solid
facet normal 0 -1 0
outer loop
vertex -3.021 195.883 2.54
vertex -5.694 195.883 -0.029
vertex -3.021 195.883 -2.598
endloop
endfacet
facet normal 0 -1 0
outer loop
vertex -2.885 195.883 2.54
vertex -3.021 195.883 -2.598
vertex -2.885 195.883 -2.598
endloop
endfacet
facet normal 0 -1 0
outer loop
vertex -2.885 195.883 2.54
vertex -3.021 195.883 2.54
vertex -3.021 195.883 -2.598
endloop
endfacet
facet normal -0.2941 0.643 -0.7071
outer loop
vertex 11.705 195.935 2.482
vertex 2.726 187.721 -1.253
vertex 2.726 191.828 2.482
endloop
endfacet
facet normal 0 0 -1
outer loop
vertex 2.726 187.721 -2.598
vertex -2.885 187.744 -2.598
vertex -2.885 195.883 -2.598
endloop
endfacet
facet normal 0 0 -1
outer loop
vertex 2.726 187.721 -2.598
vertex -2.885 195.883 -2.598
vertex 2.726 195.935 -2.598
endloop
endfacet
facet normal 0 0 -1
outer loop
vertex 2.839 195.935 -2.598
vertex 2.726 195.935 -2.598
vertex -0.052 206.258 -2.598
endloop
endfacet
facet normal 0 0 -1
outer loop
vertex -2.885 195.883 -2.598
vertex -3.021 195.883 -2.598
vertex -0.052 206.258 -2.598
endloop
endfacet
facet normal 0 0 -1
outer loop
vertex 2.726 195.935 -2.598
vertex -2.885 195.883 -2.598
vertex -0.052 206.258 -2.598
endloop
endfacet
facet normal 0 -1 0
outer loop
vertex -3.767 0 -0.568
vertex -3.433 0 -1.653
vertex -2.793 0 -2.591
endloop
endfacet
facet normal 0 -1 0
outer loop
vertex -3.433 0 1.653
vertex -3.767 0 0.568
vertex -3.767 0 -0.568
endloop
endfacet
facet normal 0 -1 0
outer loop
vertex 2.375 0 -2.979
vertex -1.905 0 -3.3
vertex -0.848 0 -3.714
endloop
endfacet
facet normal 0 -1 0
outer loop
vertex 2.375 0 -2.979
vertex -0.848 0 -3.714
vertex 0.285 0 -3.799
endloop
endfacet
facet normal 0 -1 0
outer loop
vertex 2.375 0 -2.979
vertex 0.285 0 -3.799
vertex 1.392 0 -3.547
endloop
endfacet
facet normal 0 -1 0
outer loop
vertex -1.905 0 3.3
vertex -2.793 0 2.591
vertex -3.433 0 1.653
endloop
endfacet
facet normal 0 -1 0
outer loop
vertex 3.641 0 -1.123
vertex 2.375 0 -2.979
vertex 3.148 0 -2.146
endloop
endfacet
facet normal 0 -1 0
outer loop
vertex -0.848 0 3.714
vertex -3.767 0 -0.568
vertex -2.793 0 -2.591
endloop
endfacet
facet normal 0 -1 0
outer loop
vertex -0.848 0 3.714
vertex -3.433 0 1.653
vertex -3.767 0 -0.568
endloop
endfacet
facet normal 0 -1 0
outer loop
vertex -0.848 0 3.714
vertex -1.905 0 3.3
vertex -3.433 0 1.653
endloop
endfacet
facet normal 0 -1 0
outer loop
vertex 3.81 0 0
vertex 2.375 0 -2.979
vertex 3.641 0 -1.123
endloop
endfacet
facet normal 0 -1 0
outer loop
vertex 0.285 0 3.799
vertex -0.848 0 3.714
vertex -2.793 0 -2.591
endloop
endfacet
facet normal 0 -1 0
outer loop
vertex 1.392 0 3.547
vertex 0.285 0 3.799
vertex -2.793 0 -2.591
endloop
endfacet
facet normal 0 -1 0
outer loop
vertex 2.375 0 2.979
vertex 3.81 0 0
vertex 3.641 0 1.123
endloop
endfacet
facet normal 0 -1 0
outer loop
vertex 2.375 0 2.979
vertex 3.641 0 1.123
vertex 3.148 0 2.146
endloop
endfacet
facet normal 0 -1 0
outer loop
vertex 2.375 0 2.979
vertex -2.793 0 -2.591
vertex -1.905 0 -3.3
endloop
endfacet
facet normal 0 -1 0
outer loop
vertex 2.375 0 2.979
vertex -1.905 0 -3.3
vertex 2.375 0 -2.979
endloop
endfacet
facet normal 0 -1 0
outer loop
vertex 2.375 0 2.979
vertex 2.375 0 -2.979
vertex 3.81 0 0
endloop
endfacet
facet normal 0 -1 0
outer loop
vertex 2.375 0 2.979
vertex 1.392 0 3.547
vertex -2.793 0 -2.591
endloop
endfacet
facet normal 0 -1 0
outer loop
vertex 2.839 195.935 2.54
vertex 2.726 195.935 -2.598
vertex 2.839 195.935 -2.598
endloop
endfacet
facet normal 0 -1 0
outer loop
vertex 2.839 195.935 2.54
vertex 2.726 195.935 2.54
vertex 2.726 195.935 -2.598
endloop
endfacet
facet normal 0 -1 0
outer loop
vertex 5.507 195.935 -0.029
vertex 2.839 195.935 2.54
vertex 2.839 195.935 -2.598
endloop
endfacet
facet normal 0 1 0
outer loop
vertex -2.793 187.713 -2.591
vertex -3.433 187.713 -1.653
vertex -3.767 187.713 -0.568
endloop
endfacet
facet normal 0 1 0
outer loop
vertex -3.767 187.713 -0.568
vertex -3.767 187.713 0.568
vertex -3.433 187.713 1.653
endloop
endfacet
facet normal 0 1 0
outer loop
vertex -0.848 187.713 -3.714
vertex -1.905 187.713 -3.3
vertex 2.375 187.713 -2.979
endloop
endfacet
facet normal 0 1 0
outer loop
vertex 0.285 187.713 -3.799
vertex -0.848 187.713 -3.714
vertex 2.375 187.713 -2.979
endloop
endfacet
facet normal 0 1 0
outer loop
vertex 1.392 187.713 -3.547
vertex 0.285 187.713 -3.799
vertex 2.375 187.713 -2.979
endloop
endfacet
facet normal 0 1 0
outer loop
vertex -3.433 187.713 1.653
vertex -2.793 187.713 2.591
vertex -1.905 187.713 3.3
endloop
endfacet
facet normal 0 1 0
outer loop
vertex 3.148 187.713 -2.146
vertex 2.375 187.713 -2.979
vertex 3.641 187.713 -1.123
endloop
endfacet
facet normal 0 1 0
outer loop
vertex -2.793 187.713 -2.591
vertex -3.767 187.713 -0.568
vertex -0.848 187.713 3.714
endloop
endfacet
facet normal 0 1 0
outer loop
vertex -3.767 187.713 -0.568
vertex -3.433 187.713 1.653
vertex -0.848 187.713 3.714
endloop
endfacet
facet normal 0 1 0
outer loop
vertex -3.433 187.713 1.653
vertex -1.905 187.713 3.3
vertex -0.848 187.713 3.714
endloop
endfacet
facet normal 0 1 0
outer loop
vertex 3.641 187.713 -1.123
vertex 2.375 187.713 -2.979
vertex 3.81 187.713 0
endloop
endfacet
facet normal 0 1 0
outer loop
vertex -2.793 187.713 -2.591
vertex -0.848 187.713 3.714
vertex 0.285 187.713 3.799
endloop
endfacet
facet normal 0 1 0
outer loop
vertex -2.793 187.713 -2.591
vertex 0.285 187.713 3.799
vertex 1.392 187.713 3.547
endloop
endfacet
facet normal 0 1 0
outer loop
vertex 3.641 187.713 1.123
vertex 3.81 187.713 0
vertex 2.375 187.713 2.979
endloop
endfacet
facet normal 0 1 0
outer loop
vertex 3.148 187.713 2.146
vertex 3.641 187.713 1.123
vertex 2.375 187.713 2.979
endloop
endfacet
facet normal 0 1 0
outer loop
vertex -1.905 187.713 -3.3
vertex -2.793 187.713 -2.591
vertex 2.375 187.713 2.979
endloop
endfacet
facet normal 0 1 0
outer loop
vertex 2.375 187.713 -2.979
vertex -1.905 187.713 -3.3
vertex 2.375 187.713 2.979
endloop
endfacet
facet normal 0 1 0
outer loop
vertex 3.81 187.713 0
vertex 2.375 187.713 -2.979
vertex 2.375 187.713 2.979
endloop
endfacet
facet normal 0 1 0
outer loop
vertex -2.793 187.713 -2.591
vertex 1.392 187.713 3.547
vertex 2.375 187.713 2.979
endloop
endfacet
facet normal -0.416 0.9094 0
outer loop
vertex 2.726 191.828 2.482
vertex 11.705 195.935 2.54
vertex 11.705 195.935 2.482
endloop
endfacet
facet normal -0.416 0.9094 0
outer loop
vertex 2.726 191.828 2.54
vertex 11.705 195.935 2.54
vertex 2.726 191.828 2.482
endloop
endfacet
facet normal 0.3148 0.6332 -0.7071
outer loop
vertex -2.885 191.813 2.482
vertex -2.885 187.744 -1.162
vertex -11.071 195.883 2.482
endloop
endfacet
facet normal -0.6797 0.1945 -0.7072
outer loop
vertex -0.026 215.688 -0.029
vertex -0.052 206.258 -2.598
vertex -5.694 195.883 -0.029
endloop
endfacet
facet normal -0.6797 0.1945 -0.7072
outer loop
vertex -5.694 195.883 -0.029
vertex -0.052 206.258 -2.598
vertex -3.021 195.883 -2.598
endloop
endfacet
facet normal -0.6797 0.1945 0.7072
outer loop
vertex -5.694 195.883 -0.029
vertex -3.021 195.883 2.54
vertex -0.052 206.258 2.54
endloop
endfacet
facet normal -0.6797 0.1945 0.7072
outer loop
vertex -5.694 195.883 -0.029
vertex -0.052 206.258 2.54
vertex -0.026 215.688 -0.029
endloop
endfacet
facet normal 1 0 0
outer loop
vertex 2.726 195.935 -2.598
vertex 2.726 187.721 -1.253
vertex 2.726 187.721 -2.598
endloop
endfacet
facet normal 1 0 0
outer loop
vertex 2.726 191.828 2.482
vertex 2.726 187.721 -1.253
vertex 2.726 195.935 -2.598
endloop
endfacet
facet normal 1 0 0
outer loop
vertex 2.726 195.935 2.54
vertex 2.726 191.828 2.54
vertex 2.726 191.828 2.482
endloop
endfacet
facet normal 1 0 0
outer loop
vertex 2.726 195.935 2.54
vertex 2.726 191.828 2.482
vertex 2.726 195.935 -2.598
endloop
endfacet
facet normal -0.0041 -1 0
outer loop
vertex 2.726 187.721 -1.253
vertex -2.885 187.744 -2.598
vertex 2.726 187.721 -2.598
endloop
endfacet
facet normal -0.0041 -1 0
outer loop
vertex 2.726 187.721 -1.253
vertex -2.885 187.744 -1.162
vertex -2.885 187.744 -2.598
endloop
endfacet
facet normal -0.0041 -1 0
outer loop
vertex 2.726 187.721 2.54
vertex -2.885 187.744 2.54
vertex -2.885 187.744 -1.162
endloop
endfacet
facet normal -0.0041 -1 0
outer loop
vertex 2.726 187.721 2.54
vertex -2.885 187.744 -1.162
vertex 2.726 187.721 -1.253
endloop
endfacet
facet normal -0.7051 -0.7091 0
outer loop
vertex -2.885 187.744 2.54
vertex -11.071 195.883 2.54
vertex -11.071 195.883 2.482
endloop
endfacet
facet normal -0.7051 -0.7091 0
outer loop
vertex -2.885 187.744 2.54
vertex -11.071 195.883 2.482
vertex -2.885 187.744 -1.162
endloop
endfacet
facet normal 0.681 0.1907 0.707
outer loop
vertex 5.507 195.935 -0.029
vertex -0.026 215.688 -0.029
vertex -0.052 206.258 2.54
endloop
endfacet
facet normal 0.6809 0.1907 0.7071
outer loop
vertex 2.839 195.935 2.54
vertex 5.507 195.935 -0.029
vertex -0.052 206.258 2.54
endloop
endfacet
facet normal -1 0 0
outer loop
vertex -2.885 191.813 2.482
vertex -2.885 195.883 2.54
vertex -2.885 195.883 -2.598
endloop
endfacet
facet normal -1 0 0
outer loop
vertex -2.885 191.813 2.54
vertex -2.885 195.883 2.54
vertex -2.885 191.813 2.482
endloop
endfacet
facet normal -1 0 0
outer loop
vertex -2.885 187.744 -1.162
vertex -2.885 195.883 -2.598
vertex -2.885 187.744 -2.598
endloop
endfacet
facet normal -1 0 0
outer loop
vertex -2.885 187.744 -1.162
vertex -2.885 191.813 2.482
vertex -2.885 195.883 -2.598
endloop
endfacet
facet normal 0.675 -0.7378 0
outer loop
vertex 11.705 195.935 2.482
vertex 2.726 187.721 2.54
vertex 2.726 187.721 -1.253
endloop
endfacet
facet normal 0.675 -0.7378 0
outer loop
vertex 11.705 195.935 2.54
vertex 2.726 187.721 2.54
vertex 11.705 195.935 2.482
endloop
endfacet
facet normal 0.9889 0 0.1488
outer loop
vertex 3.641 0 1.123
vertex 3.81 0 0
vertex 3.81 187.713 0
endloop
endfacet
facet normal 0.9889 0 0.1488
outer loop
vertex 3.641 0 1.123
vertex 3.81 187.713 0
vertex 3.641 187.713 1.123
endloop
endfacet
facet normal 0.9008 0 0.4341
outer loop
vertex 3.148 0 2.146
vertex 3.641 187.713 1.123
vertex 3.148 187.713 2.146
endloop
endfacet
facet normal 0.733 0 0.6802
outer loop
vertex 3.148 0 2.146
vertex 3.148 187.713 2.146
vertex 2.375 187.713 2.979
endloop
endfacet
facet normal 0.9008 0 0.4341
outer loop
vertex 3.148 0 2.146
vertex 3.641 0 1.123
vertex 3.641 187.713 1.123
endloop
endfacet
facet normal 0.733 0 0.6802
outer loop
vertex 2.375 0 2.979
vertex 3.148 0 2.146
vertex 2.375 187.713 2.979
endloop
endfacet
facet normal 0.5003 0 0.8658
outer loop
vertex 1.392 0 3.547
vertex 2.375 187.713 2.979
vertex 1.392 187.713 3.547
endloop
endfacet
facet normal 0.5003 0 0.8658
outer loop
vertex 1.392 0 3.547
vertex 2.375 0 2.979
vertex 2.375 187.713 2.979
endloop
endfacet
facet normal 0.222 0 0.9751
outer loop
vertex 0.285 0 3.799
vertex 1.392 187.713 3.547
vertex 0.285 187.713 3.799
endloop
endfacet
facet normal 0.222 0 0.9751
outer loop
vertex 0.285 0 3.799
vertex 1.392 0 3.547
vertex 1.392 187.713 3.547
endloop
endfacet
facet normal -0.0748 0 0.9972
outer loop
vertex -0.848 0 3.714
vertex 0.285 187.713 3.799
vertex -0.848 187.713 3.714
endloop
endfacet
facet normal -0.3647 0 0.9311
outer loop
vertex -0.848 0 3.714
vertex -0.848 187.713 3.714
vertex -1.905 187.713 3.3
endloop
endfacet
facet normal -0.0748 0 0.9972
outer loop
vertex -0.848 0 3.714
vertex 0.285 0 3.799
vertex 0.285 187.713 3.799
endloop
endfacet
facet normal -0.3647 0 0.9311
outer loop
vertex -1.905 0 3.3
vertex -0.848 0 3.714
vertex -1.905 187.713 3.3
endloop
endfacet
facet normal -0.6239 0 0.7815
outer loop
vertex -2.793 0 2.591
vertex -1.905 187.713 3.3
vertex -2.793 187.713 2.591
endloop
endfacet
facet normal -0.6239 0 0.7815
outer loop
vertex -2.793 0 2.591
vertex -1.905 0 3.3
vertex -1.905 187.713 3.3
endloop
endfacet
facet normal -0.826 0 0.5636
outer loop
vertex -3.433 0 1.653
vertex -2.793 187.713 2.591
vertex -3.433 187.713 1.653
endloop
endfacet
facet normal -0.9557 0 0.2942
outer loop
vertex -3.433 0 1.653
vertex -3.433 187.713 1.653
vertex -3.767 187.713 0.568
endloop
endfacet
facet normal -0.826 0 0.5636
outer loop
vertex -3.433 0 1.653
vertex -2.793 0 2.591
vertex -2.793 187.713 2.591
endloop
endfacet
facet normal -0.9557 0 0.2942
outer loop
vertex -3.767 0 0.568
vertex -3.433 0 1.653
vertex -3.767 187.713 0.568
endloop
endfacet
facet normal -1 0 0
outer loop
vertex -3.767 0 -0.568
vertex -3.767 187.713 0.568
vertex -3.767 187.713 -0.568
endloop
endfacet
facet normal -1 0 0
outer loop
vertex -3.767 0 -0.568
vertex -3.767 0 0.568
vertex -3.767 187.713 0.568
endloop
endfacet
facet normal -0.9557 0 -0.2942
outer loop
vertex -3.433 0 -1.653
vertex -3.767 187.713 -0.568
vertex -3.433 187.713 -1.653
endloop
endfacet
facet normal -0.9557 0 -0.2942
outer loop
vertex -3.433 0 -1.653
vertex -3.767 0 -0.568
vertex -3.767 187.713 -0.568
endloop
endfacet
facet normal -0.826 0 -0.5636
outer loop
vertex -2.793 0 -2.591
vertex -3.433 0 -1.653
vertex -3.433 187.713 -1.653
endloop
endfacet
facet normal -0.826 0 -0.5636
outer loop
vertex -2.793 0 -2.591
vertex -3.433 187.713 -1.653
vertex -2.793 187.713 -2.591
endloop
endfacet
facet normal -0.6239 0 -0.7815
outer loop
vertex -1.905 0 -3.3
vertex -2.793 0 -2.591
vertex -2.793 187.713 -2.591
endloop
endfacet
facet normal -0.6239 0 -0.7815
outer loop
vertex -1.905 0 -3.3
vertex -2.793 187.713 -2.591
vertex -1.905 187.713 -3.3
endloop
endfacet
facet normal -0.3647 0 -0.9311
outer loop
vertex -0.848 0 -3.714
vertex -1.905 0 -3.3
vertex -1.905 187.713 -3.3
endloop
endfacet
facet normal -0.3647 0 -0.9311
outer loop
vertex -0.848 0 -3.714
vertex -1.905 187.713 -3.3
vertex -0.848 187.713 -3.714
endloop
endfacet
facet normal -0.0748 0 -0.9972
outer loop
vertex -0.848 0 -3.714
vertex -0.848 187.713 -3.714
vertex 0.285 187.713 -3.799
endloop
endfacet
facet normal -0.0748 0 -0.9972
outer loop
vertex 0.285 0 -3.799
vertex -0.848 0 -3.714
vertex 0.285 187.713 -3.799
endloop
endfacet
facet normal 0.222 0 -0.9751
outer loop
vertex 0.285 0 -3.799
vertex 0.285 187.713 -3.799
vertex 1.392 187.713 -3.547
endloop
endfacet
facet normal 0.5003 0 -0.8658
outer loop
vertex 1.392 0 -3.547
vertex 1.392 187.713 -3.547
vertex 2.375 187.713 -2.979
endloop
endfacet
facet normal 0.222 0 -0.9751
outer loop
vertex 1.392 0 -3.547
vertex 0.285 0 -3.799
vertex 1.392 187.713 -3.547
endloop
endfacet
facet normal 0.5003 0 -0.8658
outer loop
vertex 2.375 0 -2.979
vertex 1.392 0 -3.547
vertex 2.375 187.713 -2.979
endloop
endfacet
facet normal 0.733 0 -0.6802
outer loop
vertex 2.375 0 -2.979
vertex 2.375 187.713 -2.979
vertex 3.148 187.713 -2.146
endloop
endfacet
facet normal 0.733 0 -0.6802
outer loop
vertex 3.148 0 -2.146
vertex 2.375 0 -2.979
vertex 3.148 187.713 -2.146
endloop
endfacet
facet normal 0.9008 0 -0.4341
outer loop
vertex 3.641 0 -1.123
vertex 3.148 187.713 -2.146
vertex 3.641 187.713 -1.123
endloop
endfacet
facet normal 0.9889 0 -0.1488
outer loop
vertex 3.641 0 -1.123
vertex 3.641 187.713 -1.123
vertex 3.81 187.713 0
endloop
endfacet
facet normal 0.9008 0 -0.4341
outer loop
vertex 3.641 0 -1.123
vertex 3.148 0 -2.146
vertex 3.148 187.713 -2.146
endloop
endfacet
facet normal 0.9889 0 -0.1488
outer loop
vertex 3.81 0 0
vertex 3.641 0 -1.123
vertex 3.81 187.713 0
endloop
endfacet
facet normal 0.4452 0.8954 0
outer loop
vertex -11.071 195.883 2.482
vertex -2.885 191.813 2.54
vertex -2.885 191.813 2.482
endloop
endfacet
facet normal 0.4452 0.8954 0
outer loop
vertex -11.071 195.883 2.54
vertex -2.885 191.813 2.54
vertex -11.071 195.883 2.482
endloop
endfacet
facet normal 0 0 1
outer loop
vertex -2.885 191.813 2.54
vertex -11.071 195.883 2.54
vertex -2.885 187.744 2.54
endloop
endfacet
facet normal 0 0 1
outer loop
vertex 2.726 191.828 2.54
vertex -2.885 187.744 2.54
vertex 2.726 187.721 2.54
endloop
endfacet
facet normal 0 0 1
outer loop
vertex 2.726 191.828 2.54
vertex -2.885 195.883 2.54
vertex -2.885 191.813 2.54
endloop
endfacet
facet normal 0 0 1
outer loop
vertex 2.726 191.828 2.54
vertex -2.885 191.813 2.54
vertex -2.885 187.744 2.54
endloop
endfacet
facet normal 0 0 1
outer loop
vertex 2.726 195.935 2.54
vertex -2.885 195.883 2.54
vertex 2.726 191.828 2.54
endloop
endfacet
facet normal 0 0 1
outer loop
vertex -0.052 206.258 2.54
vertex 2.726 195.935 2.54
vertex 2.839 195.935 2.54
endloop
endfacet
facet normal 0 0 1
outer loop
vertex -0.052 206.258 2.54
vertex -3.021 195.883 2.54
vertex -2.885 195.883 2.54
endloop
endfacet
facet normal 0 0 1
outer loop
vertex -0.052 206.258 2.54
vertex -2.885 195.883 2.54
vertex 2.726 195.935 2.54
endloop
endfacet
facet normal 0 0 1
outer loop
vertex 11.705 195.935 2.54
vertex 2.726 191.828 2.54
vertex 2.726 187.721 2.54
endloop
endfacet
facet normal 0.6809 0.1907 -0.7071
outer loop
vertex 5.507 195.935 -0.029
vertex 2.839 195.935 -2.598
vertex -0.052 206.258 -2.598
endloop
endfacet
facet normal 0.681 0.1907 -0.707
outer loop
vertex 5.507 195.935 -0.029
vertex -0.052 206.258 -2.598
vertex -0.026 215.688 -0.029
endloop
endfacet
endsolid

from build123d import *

# Parameters (mm, degrees)
F0_R          = 3.81
F1_DEPTH      = 187.71276
F3_DEPTH      = 2.54
F3_DEPTH_BACK = 2.59802
F4_SIZE       = 5.08
F5_T4_DEPTH   = 56.2135595652
F5_T10_DEPTH  = 56.3150595014
F5_T17_DEPTH  = 56.2135595652
F5_T21_DEPTH  = 56.3150595014
F6_T4_DEPTH   = 35.2698827679
F6_T9_DEPTH   = 36.002021323


# Not quite as in the source:
# - a fillet or chamfer that OpenCascade refuses, or shapes differently, is made with other operations: its cross-section is extruded or revolved along the edge and cut away or added


with BuildPart() as f1:
    # F0 (on Front) → F1 (new body)
    with BuildSketch(Plane.XZ):
        Circle(F0_R)
    extrude(amount=-F1_DEPTH)


with BuildPart() as f3:
    # F2 (on Top) → F3 (new body, two sides)
    with BuildSketch(Plane.XY) as f3_sk:
        Polygon((-2.8854149859, 191.8134321757), (-2.8854149859, 187.7436647788), (2.7261148207, 187.7214848121), (2.7261148207, 191.8280913989), (2.7261148207, 195.9346979856), (8.1146247685, 195.9346979856), (0, 224.9049544334), (-8.3053142529, 195.8831995726), (-2.8854149859, 195.8831995726), align=None)
        Polygon((-11.071106419, 195.8831995726), (-2.8854149859, 187.7436647788), (-2.8854149859, 191.8134321757), align=None)
        Polygon((2.7261148207, 191.8280913989), (2.7261148207, 187.7214848121), (11.7052067071, 195.9349513054), align=None)
    extrude(amount=F3_DEPTH)
    extrude(f3_sk.sketch, amount=-F3_DEPTH_BACK)

    # F4
    f4_edges = [f3.edges().sort_by_distance(p)[0] for p in [
        (4.057312, 210.419826, -2.59802),
        (-4.152657, 210.394077, -2.59802),
    ]]
    chamfer(f4_edges, length=F4_SIZE)

    # F5: chamfer of 5.08 on 2 edges, made by hand


with BuildPart() as f5_tool2:
    # F5_s3 → F5_t4 (new body)
    with BuildSketch(Plane(origin=(-46.7750694582, 166.9930275555, 0), x_dir=(0, 0, 1), z_dir=(-0.2697209417, 0.9629385305, 0))):
        with BuildLine():
            Line((-2.6836840979, 60.8052602015), (2.6836840979, 55.4378920056))
            Line((2.6836840979, 55.4378920056), (2.7852840979, 55.4378920056))
            ThreePointArc((2.7852840979, 55.4378920056), (2.6416, 58.0497340546), (2.6416, 60.6615761036))
            Line((2.6416, 60.6615761036), (2.54, 60.7631761036))
            ThreePointArc((2.54, 60.7631761036), (-0.071842049, 60.7631761036), (-2.6836840979, 60.9068602015))
            Line((-2.6836840979, 60.9068602015), (-2.6836840979, 60.8052602015))
        make_face()
    extrude(amount=F5_T4_DEPTH)

    split(bisect_by=Plane.XZ.offset(-195.9346979856), keep=Keep.BOTTOM)

    split(bisect_by=Plane(origin=(-59.4902437107, 17.0246482808, 0), x_dir=(0, 0, 1), z_dir=(0.9614067403, -0.275131023, 0)), keep=Keep.TOP)


with BuildPart() as f3_1:
    add(f3.part)

    # F5_t1: cut F5_tool2
    add(f5_tool2.part, mode=Mode.SUBTRACT)


with BuildPart() as f5_tool8:
    # F5_s9 → F5_t10 (new body)
    with BuildSketch(Plane(origin=(63.0845965483, 220.4402676135, 0), x_dir=(0, 0, 1), z_dir=(-0.275131023, -0.9614067403, 0))):
        with BuildLine():
            Line((2.6836840979, 56.6546460819), (-2.6836840979, 62.0220142778))
            Line((-2.6836840979, 62.0220142778), (-2.6836840979, 62.1236142778))
            ThreePointArc((-2.6836840979, 62.1236142778), (-0.071842049, 61.9799301798), (2.54, 61.9799301798))
            Line((2.54, 61.9799301798), (2.6416, 61.8783301798))
            ThreePointArc((2.6416, 61.8783301798), (2.6416, 59.2664881309), (2.7852840979, 56.6546460819))
            Line((2.7852840979, 56.6546460819), (2.6836840979, 56.6546460819))
        make_face()
    extrude(amount=F5_T10_DEPTH)

    split(bisect_by=Plane.XZ.offset(-195.8831995726), keep=Keep.BOTTOM)

    split(bisect_by=Plane(origin=(58.4133689537, 16.3616974319, 0), x_dir=(0, 0, 1), z_dir=(-0.9629385305, -0.2697209417, 0)), keep=Keep.TOP)


with BuildPart() as f3_2:
    add(f3_1.part)

    # F5_t7: cut F5_tool8
    add(f5_tool8.part, mode=Mode.SUBTRACT)


with BuildPart() as f5_tool15:
    # F5_s16 → F5_t17 (new body)
    with BuildSketch(Plane(origin=(-46.7750694582, 166.9930275555, 0), x_dir=(0, 0, 1), z_dir=(-0.2697209417, 0.9629385305, 0))):
        with BuildLine():
            Line((-2.6836840979, 60.8052602015), (2.6836840979, 55.4378920056))
            Line((2.6836840979, 55.4378920056), (2.7852840979, 55.4378920056))
            ThreePointArc((2.7852840979, 55.4378920056), (2.6416, 58.0497340546), (2.6416, 60.6615761036))
            Line((2.6416, 60.6615761036), (2.54, 60.7631761036))
            ThreePointArc((2.54, 60.7631761036), (-0.071842049, 60.7631761036), (-2.6836840979, 60.9068602015))
            Line((-2.6836840979, 60.9068602015), (-2.6836840979, 60.8052602015))
        make_face()
    extrude(amount=F5_T17_DEPTH)

    split(bisect_by=Plane(origin=(-59.4902437107, 17.0246482808, 0), x_dir=(0, 0, 1), z_dir=(-0.9614067403, 0.275131023, 0)), keep=Keep.TOP)


with BuildPart() as f5_tool19:
    # F5_s20 → F5_t21 (new body)
    with BuildSketch(Plane(origin=(63.0845965483, 220.4402676135, 0), x_dir=(0, 0, 1), z_dir=(-0.275131023, -0.9614067403, 0))):
        with BuildLine():
            Line((2.6836840979, 56.6546460819), (-2.6836840979, 62.0220142778))
            Line((-2.6836840979, 62.0220142778), (-2.6836840979, 62.1236142778))
            ThreePointArc((-2.6836840979, 62.1236142778), (-0.071842049, 61.9799301798), (2.54, 61.9799301798))
            Line((2.54, 61.9799301798), (2.6416, 61.8783301798))
            ThreePointArc((2.6416, 61.8783301798), (2.6416, 59.2664881309), (2.7852840979, 56.6546460819))
            Line((2.7852840979, 56.6546460819), (2.6836840979, 56.6546460819))
        make_face()
    extrude(amount=F5_T21_DEPTH)

    split(bisect_by=Plane(origin=(58.4133689537, 16.3616974319, 0), x_dir=(0, 0, 1), z_dir=(0.9629385305, 0.2697209417, 0)), keep=Keep.TOP)


with BuildPart() as f5_tool15_1:
    add(f5_tool15.part)

    # F5_t23: intersect F5_tool19
    add(f5_tool19.part, mode=Mode.INTERSECT)


with BuildPart() as f3_3:
    add(f3_2.part)

    # F5_t13: cut F5_tool15
    add(f5_tool15_1.part, mode=Mode.SUBTRACT)

    # F6: chamfer of 5.08 on 2 edges, made by hand


with BuildPart() as f6_tool2:
    # F6_s3 → F6_t4 (new body)
    with BuildSketch(Plane(origin=(-67.0801622098, 33.3509587273, 0), x_dir=(0, 0, 1), z_dir=(-0.895434728, 0.4451928211, 0))):
        Polygon((-2.59802, 165.3918424207), (2.48198, 170.4718424207), (-2.59802, 170.4718424207), align=None)
    extrude(amount=F6_T4_DEPTH)

    split(bisect_by=Plane.YZ.offset(-2.8854149859), keep=Keep.BOTTOM)


with BuildPart() as f3_4:
    add(f3_3.part)

    # F6_t1: cut F6_tool2
    add(f6_tool2.part, mode=Mode.SUBTRACT)


with BuildPart() as f6_tool7:
    # F6_s8 → F6_t9 (new body)
    with BuildSketch(Plane(origin=(95.6732562057, 43.7590643917, 0), x_dir=(0, 0, 1), z_dir=(-0.9093928041, -0.4159383703, 0))):
        Polygon((-2.59802, 168.2331901799), (2.48198, 173.3131901799), (-2.59802, 173.3131901799), align=None)
    extrude(amount=F6_T9_DEPTH)

    split(bisect_by=Plane.YZ.offset(2.7261148207), keep=Keep.TOP)


with BuildPart() as f3_5:
    add(f3_4.part)

    # F6_t6: cut F6_tool7
    add(f6_tool7.part, mode=Mode.SUBTRACT)


solid = Compound([f1.part, f3_5.part])
